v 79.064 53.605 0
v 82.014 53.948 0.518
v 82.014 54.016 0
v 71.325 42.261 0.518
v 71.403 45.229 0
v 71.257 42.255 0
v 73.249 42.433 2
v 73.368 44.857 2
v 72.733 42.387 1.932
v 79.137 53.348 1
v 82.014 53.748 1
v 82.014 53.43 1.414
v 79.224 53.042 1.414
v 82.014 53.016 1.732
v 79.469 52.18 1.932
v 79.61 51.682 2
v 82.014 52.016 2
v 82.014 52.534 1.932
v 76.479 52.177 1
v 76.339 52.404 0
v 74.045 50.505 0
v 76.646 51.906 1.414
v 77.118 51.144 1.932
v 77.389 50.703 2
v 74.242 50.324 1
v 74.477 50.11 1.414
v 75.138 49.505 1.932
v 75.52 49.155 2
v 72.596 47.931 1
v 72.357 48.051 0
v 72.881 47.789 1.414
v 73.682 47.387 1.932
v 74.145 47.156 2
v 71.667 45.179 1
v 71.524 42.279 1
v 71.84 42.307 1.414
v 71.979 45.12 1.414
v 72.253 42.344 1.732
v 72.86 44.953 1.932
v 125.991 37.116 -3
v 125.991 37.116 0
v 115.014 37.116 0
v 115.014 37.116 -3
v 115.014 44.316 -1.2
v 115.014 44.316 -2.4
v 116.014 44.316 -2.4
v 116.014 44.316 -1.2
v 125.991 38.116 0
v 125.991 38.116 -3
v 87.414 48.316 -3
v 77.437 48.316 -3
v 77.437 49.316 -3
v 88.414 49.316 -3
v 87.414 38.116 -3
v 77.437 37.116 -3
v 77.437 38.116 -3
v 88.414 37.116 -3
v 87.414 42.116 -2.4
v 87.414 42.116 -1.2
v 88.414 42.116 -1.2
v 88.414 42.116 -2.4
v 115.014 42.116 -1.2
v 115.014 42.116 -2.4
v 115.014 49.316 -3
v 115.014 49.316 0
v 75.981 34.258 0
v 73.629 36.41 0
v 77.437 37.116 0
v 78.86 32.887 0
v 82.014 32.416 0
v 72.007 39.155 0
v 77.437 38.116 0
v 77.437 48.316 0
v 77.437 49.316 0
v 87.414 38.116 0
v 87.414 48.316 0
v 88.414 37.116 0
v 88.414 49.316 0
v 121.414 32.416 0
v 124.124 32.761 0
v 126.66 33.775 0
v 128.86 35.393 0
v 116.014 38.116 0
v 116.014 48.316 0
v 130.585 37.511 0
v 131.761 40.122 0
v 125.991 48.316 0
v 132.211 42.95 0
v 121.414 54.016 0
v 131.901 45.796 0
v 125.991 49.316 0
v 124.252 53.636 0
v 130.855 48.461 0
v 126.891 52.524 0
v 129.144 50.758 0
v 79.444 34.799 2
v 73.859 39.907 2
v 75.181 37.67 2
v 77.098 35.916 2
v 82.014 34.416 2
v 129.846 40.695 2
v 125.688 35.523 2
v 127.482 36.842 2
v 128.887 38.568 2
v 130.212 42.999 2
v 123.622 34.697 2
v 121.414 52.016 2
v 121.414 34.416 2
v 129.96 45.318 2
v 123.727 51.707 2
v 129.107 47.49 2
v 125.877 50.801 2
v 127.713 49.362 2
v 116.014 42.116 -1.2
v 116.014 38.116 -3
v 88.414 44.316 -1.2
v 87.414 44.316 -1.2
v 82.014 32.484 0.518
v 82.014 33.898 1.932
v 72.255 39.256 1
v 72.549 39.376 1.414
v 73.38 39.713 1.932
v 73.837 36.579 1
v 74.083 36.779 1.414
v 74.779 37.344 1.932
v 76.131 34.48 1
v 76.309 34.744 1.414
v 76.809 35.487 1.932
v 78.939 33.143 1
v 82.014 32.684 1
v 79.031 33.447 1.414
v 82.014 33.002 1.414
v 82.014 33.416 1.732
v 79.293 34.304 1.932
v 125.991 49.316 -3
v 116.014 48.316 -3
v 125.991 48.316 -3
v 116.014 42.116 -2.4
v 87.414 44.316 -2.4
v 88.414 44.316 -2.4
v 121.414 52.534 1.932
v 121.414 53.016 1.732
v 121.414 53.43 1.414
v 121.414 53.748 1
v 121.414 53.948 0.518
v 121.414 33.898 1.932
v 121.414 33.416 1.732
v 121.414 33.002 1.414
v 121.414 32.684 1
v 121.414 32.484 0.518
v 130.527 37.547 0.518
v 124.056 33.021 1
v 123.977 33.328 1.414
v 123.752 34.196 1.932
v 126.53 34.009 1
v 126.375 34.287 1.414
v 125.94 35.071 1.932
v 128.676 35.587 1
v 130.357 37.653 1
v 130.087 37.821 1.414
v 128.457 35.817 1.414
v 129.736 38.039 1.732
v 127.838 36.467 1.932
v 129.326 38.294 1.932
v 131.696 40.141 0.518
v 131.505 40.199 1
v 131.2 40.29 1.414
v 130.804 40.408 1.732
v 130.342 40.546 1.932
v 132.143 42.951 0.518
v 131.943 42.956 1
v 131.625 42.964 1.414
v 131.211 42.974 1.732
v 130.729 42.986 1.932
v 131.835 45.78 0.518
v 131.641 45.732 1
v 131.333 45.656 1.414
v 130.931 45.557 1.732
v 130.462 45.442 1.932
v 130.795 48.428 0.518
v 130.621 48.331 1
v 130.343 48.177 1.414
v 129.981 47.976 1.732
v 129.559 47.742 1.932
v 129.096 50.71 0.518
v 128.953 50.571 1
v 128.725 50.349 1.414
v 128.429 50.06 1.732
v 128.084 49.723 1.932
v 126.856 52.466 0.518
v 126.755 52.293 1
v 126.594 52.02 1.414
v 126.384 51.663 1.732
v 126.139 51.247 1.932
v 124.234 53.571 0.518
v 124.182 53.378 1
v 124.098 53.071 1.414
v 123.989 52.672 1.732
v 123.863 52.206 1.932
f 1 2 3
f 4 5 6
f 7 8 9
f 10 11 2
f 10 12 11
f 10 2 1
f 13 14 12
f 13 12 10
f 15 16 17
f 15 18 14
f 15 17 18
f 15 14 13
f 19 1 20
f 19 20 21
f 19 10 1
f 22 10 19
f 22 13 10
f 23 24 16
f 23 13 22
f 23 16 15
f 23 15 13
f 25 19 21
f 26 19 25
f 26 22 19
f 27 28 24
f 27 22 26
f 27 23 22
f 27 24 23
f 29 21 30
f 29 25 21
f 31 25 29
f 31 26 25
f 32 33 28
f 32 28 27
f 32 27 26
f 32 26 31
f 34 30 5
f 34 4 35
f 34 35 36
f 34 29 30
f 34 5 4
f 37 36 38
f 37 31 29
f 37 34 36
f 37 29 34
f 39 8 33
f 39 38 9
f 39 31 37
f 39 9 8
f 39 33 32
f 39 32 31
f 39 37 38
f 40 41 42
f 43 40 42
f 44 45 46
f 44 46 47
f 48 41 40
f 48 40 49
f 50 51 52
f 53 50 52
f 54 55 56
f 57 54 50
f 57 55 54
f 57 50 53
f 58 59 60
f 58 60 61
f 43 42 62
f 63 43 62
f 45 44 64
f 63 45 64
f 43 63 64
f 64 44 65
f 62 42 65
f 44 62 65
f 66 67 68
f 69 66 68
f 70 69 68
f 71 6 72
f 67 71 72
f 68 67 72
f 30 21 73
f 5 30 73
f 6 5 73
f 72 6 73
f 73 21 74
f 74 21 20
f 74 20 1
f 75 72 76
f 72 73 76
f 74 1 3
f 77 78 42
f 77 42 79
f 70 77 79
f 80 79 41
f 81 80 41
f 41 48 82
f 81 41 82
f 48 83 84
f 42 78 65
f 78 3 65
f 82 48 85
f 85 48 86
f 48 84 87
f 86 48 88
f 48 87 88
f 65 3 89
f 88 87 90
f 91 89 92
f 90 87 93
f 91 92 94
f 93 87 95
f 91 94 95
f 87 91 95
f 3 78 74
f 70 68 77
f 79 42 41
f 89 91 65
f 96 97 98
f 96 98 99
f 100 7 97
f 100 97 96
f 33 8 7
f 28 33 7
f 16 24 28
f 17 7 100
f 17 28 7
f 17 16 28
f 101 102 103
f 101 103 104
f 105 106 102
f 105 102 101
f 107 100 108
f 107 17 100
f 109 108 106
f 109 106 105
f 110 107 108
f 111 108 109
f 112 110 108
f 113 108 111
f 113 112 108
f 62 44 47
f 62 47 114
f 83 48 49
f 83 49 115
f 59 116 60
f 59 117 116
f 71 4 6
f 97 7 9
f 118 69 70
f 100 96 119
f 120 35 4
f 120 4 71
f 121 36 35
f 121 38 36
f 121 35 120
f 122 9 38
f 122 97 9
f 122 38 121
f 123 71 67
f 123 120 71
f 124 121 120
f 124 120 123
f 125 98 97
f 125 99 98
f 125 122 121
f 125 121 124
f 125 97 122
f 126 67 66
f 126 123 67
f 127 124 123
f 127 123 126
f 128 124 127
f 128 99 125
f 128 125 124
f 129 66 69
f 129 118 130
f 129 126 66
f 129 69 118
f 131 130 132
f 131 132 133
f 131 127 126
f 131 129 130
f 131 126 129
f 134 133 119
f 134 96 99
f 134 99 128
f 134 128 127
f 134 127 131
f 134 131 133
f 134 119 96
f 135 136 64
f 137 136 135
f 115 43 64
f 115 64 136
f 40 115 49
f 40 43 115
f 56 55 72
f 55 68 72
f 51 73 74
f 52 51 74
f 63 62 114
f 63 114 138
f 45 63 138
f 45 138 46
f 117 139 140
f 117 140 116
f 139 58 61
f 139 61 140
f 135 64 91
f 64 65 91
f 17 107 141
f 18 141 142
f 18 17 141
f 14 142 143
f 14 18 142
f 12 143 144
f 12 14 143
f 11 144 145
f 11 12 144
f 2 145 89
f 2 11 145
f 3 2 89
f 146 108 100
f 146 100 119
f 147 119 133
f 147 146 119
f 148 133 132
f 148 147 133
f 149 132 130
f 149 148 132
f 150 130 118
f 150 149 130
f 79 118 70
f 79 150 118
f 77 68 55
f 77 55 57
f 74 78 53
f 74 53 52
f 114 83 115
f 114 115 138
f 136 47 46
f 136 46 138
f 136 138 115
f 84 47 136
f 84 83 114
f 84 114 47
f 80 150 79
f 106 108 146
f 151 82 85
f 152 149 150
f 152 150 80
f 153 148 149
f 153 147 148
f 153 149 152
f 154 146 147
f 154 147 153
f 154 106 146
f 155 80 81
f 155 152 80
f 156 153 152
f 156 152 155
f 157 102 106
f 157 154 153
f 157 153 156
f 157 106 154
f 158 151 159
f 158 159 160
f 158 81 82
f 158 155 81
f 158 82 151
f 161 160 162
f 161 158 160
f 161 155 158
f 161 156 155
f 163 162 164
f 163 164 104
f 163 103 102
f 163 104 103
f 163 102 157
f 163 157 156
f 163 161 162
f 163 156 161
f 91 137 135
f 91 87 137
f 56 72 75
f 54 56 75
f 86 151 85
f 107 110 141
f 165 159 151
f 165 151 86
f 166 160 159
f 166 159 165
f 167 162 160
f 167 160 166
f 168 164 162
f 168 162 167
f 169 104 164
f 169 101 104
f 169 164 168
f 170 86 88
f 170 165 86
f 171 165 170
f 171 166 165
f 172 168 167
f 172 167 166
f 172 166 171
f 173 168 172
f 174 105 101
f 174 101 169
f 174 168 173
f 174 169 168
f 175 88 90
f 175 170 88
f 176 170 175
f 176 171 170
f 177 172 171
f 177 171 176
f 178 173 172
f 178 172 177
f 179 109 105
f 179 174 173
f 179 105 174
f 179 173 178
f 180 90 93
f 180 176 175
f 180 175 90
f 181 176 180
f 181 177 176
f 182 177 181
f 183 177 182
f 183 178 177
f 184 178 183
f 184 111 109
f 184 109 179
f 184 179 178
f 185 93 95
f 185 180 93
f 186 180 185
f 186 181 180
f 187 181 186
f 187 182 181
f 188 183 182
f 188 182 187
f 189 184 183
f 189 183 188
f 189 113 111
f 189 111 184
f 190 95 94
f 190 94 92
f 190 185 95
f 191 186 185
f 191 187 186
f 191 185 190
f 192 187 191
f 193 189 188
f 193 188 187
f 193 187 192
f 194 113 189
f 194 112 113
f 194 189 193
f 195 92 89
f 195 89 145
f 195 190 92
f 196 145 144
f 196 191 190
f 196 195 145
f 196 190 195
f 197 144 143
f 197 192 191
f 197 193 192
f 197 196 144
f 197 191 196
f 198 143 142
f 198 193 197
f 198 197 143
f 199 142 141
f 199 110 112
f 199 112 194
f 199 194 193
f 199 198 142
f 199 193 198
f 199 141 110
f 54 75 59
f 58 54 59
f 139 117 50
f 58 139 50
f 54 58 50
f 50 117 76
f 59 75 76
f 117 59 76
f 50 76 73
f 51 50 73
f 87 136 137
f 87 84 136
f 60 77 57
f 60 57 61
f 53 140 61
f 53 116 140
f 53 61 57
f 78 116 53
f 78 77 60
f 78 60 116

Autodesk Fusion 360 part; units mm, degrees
sketch "Sketch1" plane through (0, 0, 0) normal (0, 0, 1) x (1, 0, 0)
  line L0 (82.0141, 54.0159) -> (121.4141, 54.0159)
  line L1 (121.4141, 32.4159) -> (82.0141, 32.4159)
  arc A0 (82.0141, 54.0159) -> (71.257, 42.2547) centre (82.0141, 43.2159) ccw
  arc A1 (71.257, 42.2547) -> (82.0141, 32.4159) centre (82.0141, 43.2159) ccw
  arc A2 (130.5847, 37.5114) -> (121.4141, 54.0159) centre (121.4141, 43.2159) ccw
  arc A3 (121.4141, 32.4159) -> (130.5847, 37.5114) centre (121.4141, 43.2159) ccw
  dimension "d1" = 21.6
  dimension "d58" = 39.4
extrude "Extrude1" add sketch "Sketch1" along normal blind 2
fillet "Fillet1" radius 2 4 edges at (132.2141, 43.2159, 2) (101.7141, 54.0159, 2) (71.2141, 43.2159, 2) (101.7141, 32.4159, 2)
sketch "Sketch4" plane through (0, 0, 0) normal (0, 0, -1) x (1, 0, 0)
  arc A0 (82.0141, -32.4159) -> (82.0141, -54.0159) centre (82.0141, -43.2159) ccw
  line L0 (82.0141, -54.0159) -> (121.4141, -54.0159)
  arc A1 (121.4141, -54.0159) -> (121.4141, -32.4159) centre (121.4141, -43.2159) ccw
  line L1 (121.4141, -32.4159) -> (82.0141, -32.4159)
  line L2 (71.2141, -43.2159) -> (132.2141, -43.2159) construction
  line L3 (88.4141, -37.1159) -> (88.4141, -49.3159)
  line L4 (101.7141, -32.4159) -> (101.7141, -54.0159) construction
  line L5 (72.4941, -38.1159) -> (87.4141, -38.1159)
  line L6 (87.4141, -38.1159) -> (87.4141, -48.3159)
  line L7 (87.4141, -48.3159) -> (72.4941, -48.3159)
  line L8 (77.4372, -37.1159) -> (88.4141, -37.1159)
  line L9 (88.4141, -49.3159) -> (77.4372, -49.3159)
  line L10 (77.4372, -37.1159) -> (77.4372, -49.3159)
  line L11 (115.0141, -49.3159) -> (125.991, -49.3159)
  line L12 (116.0141, -48.3159) -> (130.9341, -48.3159)
  line L13 (125.991, -37.1159) -> (125.991, -49.3159)
  line L14 (130.9341, -38.1159) -> (116.0141, -38.1159)
  line L15 (125.991, -37.1159) -> (115.0141, -37.1159)
  line L16 (116.0141, -38.1159) -> (116.0141, -48.3159)
  line L17 (115.0141, -37.1159) -> (115.0141, -49.3159)
  dimension "d18" = 17.2
  dimension "d20" = 1
  dimension "d35" = 1
  dimension "d51" = 12.2
  dimension "d52" = 1
extrude "Extrude3" add sketch "Sketch4" along normal blind 3 contours L3 L5 L6 L7 L8 L9 L10 | L11 L12 L13 L14 L15 L16 L17
sketch "Sketch6" plane through (87.4141, 0, 0) normal (-1, 0, 0) x (0, -1, 0)
  line L0 (-38.1159, 0) -> (-48.3159, 0)
  line L1 (-48.3159, 0) -> (-48.3159, -3)
  line L2 (-48.3159, -3) -> (-38.1159, -3)
  line L3 (-38.1159, -3) -> (-38.1159, 0)
  line L4 (-43.2159, -3) -> (-43.2159, 0) construction
  line L5 (-42.1159, -2.4) -> (-44.3159, -2.4)
  line L6 (-44.3159, -2.4) -> (-44.3159, -1.2)
  line L7 (-44.3159, -1.2) -> (-42.1159, -1.2)
  line L8 (-42.1159, -1.2) -> (-42.1159, -2.4)
  dimension "d23" = 2.2
  dimension "d24" = 1.2
  dimension "d25" = 0.6
extrude "Extrude4" cut sketch "Sketch6" against normal blind 33 contours L5 L6 L7 L8
